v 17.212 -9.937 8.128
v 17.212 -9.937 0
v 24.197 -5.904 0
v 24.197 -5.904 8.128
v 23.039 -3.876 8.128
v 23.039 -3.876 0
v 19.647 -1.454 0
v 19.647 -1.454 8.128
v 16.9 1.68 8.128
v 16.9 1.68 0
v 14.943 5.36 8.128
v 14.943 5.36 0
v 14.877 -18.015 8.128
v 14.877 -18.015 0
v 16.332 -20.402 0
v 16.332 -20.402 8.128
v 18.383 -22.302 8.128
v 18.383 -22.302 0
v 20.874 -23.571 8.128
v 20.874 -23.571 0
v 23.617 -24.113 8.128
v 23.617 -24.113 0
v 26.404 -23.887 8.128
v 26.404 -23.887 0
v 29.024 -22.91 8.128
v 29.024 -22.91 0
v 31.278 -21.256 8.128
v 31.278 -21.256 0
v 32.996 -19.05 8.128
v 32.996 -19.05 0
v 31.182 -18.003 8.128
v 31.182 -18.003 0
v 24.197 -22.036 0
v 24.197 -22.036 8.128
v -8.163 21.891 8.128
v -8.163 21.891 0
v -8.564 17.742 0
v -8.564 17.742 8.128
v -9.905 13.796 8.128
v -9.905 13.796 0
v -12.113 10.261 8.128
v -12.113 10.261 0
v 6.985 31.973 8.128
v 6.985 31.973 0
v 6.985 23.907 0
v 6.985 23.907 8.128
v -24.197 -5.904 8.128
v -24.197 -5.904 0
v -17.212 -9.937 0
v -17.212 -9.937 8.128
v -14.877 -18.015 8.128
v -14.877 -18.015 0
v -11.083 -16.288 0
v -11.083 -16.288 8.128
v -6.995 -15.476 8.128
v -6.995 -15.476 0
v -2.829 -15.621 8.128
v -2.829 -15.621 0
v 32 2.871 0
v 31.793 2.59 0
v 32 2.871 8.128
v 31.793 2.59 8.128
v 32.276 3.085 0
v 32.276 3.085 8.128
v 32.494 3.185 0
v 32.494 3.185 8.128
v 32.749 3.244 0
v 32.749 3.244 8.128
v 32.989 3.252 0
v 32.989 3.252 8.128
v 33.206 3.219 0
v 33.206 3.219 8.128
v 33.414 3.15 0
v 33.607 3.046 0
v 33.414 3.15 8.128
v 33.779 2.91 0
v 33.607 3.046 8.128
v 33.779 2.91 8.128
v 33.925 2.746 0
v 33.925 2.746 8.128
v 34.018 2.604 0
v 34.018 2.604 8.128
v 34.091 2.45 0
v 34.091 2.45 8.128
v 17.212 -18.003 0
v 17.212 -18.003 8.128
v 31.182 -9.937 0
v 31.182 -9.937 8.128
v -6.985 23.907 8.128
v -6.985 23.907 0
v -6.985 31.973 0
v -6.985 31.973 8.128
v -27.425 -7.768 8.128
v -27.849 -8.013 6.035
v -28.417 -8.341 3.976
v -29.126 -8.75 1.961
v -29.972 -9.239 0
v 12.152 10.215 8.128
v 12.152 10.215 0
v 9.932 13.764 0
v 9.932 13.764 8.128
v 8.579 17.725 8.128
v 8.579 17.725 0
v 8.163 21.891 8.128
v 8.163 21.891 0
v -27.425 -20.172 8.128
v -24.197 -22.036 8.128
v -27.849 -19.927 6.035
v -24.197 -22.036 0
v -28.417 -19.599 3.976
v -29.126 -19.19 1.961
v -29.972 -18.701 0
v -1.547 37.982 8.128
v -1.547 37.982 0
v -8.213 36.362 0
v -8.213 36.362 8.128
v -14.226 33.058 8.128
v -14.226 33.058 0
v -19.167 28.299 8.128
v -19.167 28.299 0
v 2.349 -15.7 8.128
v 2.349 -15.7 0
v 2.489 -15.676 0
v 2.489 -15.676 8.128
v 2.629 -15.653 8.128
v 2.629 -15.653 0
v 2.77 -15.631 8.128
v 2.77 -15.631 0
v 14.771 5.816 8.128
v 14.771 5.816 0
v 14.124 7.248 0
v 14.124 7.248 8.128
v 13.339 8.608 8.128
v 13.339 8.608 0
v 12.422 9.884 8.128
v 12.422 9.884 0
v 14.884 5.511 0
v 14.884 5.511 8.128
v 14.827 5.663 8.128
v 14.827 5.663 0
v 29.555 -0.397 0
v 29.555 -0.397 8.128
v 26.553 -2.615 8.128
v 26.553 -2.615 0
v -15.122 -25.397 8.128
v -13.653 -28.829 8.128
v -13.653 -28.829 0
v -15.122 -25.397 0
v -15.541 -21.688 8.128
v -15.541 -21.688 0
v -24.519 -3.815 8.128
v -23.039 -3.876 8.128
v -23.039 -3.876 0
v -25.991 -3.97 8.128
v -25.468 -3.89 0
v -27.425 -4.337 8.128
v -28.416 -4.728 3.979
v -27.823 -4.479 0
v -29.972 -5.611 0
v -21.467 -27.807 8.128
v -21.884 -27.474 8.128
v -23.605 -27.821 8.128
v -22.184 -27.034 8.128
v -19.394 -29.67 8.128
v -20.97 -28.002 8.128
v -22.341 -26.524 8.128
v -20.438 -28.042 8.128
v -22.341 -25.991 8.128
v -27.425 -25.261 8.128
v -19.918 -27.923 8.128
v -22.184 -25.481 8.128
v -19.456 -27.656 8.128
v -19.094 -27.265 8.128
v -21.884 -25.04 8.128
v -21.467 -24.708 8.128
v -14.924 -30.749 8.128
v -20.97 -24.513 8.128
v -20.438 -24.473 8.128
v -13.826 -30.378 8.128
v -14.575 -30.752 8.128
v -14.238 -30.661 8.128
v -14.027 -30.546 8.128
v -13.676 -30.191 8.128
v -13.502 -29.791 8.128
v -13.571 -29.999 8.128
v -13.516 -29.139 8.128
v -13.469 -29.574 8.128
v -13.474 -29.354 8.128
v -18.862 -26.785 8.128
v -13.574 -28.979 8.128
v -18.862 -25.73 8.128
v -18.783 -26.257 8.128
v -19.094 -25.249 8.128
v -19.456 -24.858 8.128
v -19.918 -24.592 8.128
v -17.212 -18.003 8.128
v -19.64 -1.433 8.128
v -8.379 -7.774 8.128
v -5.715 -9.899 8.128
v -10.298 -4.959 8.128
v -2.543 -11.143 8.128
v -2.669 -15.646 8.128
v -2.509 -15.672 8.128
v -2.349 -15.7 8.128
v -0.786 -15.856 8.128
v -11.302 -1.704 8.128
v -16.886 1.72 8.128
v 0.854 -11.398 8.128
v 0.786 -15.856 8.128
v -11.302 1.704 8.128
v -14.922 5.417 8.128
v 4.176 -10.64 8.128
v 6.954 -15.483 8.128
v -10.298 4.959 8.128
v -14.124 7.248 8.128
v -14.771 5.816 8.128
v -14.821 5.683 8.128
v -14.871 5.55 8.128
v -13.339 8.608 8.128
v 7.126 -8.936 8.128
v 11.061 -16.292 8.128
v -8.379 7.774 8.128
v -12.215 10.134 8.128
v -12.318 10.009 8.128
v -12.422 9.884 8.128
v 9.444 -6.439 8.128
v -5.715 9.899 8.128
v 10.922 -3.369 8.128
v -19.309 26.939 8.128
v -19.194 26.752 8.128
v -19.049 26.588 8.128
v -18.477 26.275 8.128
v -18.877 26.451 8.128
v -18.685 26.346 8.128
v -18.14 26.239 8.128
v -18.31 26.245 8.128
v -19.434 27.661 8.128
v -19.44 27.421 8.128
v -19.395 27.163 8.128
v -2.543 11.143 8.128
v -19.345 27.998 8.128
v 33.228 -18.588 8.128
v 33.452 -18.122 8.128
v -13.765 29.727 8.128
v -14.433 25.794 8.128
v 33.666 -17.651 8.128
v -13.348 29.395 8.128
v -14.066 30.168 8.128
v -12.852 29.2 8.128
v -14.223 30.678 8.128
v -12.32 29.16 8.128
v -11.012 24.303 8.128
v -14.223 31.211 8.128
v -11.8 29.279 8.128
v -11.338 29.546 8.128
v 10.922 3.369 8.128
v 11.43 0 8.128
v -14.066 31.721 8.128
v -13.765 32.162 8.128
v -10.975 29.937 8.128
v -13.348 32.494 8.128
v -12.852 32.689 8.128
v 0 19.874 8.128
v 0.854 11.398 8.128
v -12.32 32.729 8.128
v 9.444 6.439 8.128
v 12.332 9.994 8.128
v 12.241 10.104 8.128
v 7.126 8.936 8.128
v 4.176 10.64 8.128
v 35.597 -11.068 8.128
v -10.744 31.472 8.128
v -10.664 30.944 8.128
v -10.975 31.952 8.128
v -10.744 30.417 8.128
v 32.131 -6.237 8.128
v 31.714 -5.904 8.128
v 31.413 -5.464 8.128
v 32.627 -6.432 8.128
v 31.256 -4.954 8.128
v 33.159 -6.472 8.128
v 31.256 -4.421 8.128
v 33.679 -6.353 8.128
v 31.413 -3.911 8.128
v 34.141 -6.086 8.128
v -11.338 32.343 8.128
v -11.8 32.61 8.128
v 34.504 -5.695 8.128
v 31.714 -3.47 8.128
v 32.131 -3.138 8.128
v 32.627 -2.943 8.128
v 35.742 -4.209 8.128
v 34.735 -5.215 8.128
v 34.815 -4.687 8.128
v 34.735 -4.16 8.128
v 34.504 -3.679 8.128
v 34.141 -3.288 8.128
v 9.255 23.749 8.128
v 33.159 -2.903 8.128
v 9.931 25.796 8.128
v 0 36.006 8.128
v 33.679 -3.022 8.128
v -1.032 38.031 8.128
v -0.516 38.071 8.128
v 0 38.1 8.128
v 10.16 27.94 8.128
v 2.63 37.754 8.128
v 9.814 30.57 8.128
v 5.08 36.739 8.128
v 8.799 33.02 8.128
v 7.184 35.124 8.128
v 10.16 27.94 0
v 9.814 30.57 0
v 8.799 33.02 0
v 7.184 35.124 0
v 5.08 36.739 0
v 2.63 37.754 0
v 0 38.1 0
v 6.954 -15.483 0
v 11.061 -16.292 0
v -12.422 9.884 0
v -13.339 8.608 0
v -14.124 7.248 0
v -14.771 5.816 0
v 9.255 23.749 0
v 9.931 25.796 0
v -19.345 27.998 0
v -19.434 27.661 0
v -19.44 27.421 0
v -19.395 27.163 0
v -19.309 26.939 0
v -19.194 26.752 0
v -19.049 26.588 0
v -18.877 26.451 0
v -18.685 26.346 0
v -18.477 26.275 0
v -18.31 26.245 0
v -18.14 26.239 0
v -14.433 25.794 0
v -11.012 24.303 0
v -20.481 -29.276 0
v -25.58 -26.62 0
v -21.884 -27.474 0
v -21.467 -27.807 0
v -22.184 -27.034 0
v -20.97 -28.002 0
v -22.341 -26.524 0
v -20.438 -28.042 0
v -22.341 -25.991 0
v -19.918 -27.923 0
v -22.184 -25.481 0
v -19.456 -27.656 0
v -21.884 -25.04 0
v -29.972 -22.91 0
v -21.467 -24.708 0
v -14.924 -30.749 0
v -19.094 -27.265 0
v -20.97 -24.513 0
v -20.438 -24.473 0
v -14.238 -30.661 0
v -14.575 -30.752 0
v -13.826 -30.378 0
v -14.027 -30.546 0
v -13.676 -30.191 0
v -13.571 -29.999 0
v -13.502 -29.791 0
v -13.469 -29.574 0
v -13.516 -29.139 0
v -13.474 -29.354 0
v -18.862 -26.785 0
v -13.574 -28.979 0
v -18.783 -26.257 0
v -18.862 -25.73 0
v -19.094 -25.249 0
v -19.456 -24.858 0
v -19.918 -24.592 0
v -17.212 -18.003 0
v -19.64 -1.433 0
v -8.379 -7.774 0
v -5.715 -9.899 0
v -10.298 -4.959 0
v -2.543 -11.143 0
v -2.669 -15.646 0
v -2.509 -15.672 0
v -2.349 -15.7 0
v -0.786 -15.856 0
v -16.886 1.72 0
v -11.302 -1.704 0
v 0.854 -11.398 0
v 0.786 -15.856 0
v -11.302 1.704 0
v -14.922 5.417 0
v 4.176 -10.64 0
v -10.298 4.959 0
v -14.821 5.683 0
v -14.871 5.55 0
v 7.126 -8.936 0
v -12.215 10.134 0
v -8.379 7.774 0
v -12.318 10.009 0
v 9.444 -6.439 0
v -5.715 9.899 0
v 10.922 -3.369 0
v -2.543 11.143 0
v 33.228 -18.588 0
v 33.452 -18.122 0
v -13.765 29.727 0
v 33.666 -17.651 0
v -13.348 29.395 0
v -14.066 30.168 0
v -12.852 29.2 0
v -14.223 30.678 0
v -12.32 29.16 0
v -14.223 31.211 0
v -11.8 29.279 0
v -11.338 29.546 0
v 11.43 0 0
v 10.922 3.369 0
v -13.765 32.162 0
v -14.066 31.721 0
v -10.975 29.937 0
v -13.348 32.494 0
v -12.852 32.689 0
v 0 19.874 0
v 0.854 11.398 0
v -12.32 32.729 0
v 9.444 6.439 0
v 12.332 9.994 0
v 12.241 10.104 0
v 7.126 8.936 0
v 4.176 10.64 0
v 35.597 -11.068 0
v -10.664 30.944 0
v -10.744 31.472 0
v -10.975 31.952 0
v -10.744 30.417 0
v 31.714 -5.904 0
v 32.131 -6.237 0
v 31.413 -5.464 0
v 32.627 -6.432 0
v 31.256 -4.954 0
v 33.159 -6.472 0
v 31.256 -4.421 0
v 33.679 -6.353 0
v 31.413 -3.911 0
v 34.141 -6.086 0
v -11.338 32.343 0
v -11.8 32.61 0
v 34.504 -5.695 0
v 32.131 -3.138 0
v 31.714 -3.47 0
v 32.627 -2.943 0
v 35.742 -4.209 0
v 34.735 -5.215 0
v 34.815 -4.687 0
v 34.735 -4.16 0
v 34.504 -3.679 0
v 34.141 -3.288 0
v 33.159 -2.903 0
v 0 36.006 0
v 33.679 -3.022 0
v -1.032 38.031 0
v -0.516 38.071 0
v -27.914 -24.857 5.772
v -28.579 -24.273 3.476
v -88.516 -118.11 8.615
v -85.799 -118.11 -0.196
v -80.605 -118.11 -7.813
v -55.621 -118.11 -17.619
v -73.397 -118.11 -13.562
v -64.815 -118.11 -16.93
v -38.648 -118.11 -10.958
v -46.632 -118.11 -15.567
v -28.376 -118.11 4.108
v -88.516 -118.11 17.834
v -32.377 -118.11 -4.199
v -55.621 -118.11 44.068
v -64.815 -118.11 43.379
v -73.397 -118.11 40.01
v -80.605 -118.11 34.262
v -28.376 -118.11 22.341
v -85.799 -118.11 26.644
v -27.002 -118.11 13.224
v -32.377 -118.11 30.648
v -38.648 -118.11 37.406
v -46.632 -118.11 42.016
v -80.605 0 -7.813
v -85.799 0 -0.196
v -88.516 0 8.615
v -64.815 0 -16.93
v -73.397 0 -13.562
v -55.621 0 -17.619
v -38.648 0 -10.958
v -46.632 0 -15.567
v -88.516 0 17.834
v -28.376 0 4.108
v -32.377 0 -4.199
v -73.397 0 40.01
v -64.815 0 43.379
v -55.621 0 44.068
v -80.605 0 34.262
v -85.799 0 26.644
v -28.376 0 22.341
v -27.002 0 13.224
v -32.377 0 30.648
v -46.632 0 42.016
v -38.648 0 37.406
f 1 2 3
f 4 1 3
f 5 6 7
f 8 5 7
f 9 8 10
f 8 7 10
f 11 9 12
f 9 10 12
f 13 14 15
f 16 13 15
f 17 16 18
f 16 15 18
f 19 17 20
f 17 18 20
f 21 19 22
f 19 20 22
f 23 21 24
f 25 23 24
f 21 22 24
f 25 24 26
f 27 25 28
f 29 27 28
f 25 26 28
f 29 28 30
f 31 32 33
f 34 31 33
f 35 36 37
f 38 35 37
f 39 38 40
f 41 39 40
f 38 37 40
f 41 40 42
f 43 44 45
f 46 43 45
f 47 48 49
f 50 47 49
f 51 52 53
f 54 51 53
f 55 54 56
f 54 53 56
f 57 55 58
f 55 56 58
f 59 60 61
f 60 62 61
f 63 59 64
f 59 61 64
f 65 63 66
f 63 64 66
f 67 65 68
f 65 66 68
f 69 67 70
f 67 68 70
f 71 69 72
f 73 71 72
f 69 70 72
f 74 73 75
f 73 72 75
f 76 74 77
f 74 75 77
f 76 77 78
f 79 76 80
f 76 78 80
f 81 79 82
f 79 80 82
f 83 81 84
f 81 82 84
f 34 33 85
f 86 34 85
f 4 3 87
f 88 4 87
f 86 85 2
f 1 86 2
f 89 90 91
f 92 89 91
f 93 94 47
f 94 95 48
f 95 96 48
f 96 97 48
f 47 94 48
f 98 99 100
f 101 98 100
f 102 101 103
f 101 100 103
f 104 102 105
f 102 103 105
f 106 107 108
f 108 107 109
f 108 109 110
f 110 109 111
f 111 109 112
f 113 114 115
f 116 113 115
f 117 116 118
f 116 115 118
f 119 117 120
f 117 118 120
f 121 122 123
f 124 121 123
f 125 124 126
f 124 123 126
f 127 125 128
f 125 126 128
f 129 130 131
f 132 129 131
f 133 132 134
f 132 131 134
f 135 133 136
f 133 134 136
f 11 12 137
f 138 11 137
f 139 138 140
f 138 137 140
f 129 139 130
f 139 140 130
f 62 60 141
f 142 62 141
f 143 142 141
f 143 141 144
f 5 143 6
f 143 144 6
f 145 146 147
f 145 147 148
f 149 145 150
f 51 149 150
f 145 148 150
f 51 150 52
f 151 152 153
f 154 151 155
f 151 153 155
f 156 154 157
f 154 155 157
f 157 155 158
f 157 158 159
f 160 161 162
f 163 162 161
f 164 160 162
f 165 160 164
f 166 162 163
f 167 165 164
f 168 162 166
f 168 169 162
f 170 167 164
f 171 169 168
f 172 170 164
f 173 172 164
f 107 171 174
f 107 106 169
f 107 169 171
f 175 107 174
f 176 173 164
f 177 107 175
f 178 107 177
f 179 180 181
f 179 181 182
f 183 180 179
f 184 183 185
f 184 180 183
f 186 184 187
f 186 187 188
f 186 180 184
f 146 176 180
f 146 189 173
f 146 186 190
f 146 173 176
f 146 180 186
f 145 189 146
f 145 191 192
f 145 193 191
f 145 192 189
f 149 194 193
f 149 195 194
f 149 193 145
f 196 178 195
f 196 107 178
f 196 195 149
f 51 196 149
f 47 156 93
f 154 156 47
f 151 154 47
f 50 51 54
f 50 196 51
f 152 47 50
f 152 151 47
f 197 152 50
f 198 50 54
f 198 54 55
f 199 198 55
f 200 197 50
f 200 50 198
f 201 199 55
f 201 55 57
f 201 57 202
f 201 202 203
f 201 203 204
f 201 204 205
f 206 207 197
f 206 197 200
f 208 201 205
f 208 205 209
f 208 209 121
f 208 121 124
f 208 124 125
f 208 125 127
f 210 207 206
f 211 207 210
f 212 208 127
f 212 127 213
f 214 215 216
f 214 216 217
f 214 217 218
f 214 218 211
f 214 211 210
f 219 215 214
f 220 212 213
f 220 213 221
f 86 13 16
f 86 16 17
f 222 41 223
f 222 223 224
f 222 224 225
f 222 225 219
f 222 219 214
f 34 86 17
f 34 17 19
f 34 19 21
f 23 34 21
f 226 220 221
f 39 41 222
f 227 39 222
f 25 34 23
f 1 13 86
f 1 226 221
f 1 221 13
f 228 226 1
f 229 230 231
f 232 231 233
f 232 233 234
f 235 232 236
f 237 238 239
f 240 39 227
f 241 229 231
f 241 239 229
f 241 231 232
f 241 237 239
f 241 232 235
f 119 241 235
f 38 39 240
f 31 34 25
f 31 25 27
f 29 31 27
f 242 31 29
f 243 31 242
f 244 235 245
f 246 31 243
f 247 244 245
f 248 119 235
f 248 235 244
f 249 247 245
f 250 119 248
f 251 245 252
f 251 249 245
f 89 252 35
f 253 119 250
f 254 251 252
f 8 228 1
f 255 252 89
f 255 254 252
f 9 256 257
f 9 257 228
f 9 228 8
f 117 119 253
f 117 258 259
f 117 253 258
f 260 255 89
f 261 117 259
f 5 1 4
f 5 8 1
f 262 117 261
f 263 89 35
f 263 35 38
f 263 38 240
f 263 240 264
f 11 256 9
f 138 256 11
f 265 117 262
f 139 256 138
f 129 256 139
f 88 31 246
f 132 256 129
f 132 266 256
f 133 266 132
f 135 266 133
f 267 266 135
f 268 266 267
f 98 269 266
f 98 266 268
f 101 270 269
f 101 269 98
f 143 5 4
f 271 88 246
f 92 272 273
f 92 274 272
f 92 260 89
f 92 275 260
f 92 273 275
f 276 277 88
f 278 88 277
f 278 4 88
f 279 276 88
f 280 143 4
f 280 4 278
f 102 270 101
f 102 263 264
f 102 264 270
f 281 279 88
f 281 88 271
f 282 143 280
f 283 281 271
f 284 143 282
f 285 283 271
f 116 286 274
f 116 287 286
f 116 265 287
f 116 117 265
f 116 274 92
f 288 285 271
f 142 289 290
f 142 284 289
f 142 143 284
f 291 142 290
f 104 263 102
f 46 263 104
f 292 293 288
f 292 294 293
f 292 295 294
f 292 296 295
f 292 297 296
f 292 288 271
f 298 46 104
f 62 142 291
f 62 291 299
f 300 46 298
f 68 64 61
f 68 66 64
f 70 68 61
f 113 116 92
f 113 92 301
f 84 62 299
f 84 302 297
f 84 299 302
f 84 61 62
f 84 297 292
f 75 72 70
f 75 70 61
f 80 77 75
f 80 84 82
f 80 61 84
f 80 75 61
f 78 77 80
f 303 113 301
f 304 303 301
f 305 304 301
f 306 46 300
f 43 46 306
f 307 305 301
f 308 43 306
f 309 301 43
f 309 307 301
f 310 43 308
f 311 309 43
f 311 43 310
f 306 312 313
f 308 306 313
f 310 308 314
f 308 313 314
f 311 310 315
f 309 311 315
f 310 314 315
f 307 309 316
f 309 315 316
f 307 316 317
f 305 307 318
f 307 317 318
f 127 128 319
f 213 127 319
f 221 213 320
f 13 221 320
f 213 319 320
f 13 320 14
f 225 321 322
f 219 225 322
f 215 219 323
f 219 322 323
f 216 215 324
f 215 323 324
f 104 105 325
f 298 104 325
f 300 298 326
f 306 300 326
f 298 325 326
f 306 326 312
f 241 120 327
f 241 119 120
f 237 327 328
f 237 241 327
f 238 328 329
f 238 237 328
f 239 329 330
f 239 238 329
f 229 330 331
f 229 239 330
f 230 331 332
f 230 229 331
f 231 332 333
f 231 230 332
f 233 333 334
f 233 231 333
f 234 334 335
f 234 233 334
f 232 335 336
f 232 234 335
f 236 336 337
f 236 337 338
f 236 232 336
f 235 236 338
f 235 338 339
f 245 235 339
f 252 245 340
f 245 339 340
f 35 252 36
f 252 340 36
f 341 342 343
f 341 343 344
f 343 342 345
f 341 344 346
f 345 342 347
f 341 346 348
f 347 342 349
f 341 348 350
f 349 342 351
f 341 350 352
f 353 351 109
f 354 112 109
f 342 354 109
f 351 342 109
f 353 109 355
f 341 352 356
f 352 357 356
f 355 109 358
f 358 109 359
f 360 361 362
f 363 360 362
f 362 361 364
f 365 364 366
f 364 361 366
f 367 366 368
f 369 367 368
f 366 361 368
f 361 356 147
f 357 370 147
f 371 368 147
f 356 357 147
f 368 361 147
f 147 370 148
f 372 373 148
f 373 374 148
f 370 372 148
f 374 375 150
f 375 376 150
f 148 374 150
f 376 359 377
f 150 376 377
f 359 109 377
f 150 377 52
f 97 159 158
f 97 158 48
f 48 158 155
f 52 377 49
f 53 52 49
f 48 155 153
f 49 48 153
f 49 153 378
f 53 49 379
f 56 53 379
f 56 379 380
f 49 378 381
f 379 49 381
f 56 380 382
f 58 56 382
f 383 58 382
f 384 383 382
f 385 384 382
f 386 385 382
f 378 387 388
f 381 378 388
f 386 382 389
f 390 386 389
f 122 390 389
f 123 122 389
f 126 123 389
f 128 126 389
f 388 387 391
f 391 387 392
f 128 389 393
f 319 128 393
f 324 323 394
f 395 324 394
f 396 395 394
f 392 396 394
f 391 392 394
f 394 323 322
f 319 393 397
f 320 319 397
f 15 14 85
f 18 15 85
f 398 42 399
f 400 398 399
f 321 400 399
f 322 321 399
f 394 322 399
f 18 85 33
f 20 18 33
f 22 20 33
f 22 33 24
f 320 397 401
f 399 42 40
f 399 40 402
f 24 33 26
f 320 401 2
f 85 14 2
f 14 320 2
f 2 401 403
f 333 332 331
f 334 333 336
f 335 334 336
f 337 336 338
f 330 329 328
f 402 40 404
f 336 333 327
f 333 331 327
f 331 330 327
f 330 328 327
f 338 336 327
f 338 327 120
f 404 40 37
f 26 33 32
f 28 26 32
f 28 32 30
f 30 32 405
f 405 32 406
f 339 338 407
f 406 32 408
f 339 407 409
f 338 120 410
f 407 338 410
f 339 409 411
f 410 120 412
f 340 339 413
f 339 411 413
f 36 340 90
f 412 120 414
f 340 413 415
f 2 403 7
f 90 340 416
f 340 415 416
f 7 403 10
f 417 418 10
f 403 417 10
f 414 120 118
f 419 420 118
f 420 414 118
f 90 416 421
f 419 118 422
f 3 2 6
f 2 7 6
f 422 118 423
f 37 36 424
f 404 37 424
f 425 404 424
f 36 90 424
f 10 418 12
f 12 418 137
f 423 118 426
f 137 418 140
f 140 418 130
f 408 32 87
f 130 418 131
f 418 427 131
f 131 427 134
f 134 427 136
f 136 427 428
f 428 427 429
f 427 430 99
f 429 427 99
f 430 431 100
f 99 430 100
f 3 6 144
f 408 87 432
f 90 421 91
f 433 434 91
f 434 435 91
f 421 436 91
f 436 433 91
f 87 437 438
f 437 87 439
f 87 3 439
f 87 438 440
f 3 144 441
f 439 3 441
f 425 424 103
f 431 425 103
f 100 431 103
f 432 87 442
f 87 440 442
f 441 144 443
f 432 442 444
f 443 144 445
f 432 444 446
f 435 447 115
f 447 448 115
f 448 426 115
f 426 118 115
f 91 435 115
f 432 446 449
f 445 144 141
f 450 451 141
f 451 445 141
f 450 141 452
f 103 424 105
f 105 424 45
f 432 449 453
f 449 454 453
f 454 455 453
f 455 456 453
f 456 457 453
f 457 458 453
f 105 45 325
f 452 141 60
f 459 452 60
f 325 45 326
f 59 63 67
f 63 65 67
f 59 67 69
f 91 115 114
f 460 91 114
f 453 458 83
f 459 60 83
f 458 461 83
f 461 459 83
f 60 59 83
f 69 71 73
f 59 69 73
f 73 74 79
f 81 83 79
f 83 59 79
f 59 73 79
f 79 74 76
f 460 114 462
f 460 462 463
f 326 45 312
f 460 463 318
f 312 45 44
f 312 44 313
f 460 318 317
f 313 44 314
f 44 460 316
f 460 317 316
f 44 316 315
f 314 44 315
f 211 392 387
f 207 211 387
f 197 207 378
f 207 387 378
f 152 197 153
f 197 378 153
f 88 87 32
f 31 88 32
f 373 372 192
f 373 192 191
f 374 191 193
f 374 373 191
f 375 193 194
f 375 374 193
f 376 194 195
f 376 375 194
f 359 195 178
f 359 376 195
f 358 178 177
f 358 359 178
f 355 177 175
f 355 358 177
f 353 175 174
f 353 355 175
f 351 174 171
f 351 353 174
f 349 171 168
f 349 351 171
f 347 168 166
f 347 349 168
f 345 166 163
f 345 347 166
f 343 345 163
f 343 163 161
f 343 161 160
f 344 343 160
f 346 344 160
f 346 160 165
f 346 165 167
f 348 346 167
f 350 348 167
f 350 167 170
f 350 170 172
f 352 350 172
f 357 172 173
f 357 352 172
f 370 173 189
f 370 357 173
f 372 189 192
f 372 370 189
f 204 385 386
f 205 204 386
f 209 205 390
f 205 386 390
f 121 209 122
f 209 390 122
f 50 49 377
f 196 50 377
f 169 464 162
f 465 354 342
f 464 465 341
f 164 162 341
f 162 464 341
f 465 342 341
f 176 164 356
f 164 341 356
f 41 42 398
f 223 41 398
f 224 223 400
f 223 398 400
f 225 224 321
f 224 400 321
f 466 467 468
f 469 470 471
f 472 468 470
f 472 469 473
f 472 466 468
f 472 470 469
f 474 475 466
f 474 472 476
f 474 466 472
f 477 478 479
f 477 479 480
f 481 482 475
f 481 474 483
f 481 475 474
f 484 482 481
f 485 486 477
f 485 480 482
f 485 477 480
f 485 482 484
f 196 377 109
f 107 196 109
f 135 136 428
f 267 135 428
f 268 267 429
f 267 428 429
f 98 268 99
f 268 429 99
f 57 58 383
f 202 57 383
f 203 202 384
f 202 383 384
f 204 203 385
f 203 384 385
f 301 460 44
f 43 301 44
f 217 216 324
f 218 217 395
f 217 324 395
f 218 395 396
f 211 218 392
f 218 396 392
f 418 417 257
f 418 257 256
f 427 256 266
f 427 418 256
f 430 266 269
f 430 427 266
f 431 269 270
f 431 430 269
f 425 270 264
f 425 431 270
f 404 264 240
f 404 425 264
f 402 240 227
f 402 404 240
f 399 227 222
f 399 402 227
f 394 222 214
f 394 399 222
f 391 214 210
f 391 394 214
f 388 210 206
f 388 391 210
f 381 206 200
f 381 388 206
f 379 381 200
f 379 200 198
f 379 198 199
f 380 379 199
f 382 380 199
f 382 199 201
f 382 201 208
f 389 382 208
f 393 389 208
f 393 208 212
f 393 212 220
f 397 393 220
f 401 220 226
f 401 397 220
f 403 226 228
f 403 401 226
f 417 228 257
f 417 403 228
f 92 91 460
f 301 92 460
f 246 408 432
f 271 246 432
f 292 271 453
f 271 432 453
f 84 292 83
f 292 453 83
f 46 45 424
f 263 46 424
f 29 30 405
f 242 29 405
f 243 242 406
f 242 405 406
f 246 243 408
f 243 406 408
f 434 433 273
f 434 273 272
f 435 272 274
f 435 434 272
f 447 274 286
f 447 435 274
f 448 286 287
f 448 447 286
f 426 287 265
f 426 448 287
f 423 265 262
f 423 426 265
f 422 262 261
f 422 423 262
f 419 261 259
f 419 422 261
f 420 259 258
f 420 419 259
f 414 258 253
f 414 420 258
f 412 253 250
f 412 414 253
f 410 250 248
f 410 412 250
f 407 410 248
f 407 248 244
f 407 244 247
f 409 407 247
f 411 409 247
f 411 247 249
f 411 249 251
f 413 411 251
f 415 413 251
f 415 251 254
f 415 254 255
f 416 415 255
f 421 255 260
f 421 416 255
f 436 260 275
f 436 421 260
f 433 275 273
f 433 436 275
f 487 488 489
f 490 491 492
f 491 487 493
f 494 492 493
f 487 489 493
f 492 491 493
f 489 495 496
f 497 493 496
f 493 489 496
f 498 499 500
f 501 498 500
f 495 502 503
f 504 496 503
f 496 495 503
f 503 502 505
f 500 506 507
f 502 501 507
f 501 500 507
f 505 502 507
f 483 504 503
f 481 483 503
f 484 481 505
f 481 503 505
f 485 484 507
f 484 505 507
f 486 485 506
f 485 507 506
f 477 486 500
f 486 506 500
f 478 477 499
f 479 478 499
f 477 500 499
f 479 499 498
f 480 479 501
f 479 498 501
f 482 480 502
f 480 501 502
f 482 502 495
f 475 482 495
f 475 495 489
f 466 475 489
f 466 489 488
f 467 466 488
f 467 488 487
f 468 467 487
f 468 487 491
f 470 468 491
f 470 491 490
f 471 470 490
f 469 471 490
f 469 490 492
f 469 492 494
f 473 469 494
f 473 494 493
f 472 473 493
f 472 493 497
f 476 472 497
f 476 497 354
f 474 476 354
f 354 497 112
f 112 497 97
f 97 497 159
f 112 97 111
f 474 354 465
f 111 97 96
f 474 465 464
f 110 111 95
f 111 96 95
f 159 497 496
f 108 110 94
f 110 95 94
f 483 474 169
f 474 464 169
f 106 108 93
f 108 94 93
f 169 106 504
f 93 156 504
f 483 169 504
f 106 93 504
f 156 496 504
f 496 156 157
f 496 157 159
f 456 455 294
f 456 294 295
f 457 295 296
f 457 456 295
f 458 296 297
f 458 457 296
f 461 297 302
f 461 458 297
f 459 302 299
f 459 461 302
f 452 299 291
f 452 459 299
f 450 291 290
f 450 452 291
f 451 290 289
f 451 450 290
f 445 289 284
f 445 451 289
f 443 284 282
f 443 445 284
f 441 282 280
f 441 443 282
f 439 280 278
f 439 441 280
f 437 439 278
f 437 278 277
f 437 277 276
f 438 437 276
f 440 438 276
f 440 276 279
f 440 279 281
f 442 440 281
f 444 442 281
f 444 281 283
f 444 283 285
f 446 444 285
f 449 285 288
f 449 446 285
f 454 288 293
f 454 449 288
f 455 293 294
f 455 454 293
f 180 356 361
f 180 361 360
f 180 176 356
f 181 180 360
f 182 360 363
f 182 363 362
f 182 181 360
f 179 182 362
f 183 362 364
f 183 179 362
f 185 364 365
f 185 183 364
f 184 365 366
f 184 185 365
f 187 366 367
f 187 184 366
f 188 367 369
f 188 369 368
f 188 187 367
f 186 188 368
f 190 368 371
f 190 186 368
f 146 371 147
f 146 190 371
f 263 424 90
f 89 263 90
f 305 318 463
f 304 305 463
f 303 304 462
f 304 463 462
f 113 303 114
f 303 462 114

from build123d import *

# Parameters (mm, degrees)
F0_R     = 1.78928
F0_R_2   = 11.43
F1_DEPTH = 8.128
F2_R     = 1.27
F3_R     = 30.929844
F4_DEPTH = 118.11


with BuildPart() as f1:
    # F0 (on Top) → F1 (new body)
    with BuildSketch(Plane.XY):
        with BuildLine():
            ThreePointArc((12.152307, 10.214552), (9.141542, 15.705526), (8.1629, 21.890813))
            ThreePointArc((8.1629, 21.890813), (0, 17.78), (-8.1629, 21.890813))
            ThreePointArc((-8.1629, 21.890813), (-9.120339, 15.730112), (-12.113273, 10.260811))
            ThreePointArc((-12.113273, 10.260811), (0.030263, 15.874971), (12.152307, 10.214552))
        make_face()
        with BuildLine():
            ThreePointArc((10.16, 27.94), (7.184205, 35.124205), (0, 38.1))
            ThreePointArc((0, 38.1), (-0.774338, 38.052294), (-1.546912, 37.981547))
            ThreePointArc((-1.546912, 37.981547), (-9.396704, 31.80362), (-8.1629, 21.890813))
            ThreePointArc((-8.1629, 21.890813), (0, 17.78), (8.1629, 21.890813))
            ThreePointArc((8.1629, 21.890813), (9.647815, 24.754836), (10.16, 27.94))
        make_face()
        Polygon((-6.985, 31.972792), (0, 36.005583), (6.985, 31.972792), (6.985, 23.907208), (0, 19.874417), (-6.985, 23.907208), align=None, mode=Mode.SUBTRACT)
        with BuildLine():
            ThreePointArc((-8.1629, 21.890813), (-9.396704, 31.80362), (-1.546912, 37.981547))
            ThreePointArc((-1.546912, 37.981547), (-12.612928, 34.15479), (-20.884238, 25.867077))
            ThreePointArc((-20.884238, 25.867077), (-13.967457, 25.658122), (-8.1629, 21.890813))
        make_face()
        with Locations((-12.453423, 30.944496)):
            Circle(F0_R, mode=Mode.SUBTRACT)
        with BuildLine():
            ThreePointArc((2.348846, -15.700272), (2.559176, -15.664647), (2.769908, -15.631482))
            ThreePointArc((2.769908, -15.631482), (12.165277, -10.199101), (15.875, 0))
            ThreePointArc((15.875, 0), (15.640204, 2.720232), (14.942759, 5.359997))
            ThreePointArc((14.942759, 5.359997), (14.855473, 5.587409), (14.771257, 5.815976))
            ThreePointArc((14.771257, 5.815976), (13.748153, 7.9375), (12.422412, 9.884296))
            ThreePointArc((12.422412, 9.884296), (12.286395, 10.048635), (12.152307, 10.214552))
            ThreePointArc((12.152307, 10.214552), (0.030263, 15.874971), (-12.113273, 10.260811))
            ThreePointArc((-12.113273, 10.260811), (-12.266574, 10.071512), (-12.422412, 9.884296))
            ThreePointArc((-12.422412, 9.884296), (-13.748153, 7.9375), (-14.771257, 5.815976))
            ThreePointArc((-14.771257, 5.815976), (-14.845571, 5.616012), (-14.922215, 5.41693))
            ThreePointArc((-14.922215, 5.41693), (-13.76326, -7.911277), (-2.829486, -15.620808))
            ThreePointArc((-2.829486, -15.620808), (-2.588898, -15.658921), (-2.348846, -15.700272))
            ThreePointArc((-2.348846, -15.700272), (0, -15.875), (2.348846, -15.700272))
        make_face()
        Circle(F0_R_2, mode=Mode.SUBTRACT)
        with BuildLine():
            ThreePointArc((-23.03945, -3.876128), (-32.691442, -8.39633), (-32.995568, -19.05))
            ThreePointArc((-32.995568, -19.05), (-32.567084, -19.696744), (-32.119528, -20.330439))
            ThreePointArc((-32.119528, -20.330439), (-22.844391, -24.039594), (-14.87655, -18.014685))
            ThreePointArc((-14.87655, -18.014685), (-14.248915, -16.035474), (-14.03675, -13.97))
            ThreePointArc((-14.03675, -13.97), (-16.614409, -7.207329), (-23.03945, -3.876128))
        make_face()
        Polygon((-17.21175, -9.937208), (-17.21175, -18.002792), (-24.19675, -22.035583), (-31.18175, -18.002792), (-31.18175, -9.937208), (-24.19675, -5.904417), align=None, mode=Mode.SUBTRACT)
        with BuildLine():
            ThreePointArc((-14.922215, 5.41693), (-18.172156, 0.064044), (-23.03945, -3.876128))
            ThreePointArc((-23.03945, -3.876128), (-16.614409, -7.207329), (-14.03675, -13.97))
            ThreePointArc((-14.03675, -13.97), (-14.248915, -16.035474), (-14.87655, -18.014685))
            ThreePointArc((-14.87655, -18.014685), (-9.062508, -15.763501), (-2.829486, -15.620808))
            ThreePointArc((-2.829486, -15.620808), (-13.76326, -7.911277), (-14.922215, 5.41693))
        make_face()
        with BuildLine():
            ThreePointArc((-14.87655, -18.014685), (-22.844391, -24.039594), (-32.119528, -20.330439))
            ThreePointArc((-32.119528, -20.330439), (-23.272452, -28.000511), (-11.959427, -31.019819))
            ThreePointArc((-11.959427, -31.019819), (-15.236857, -24.925234), (-14.87655, -18.014685))
        make_face()
        with Locations((-20.572009, -26.257229)):
            Circle(F0_R, mode=Mode.SUBTRACT)
        with BuildLine():
            ThreePointArc((2.769908, -15.631482), (9.030614, -15.76957), (14.87655, -18.014685))
            ThreePointArc((14.87655, -18.014685), (15.397932, -8.89), (23.03945, -3.876128))
            ThreePointArc((23.03945, -3.876128), (18.182846, 0.033389), (14.942759, 5.359997))
            ThreePointArc((14.942759, 5.359997), (15.640204, 2.720232), (15.875, 0))
            ThreePointArc((15.875, 0), (12.165277, -10.199101), (2.769908, -15.631482))
        make_face()
        with BuildLine():
            ThreePointArc((14.87655, -18.014685), (23.617156, -24.113455), (32.995568, -19.05))
            ThreePointArc((32.995568, -19.05), (33.341423, -18.355551), (33.666441, -17.651108))
            ThreePointArc((33.666441, -17.651108), (34.182681, -15.842637), (34.35675, -13.97))
            ThreePointArc((34.35675, -13.97), (30.95942, -6.38766), (23.03945, -3.876128))
            ThreePointArc((23.03945, -3.876128), (15.397932, -8.89), (14.87655, -18.014685))
        make_face()
        Polygon((17.21175, -9.937208), (24.19675, -5.904417), (31.18175, -9.937208), (31.18175, -18.002792), (24.19675, -22.035583), (17.21175, -18.002792), align=None, mode=Mode.SUBTRACT)
        with BuildLine():
            ThreePointArc((34.35675, -13.97), (34.182681, -15.842637), (33.666441, -17.651108))
            ThreePointArc((33.666441, -17.651108), (35.88538, -6.154279), (32.843664, 5.152742))
            ThreePointArc((32.843664, 5.152742), (29.204314, -0.732888), (23.03945, -3.876128))
            ThreePointArc((23.03945, -3.876128), (30.95942, -6.38766), (34.35675, -13.97))
        make_face()
        with Locations((33.025431, -4.687268)):
            Circle(F0_R, mode=Mode.SUBTRACT)
    extrude(amount=F1_DEPTH)

    # F2
    f2_edges = [f1.edges().sort_by_distance(p)[0] for p in [
        (-20.884238, 25.867077, 4.064),
        (-11.959427, -31.019819, 4.064),
        (32.843664, 5.152742, 4.064),
    ]]
    fillet(f2_edges, radius=F2_R)

    # F3 (on Front) → F4 (join)
    with BuildSketch(Plane.XZ):
        with Locations((-57.932083, 13.224379)):
            Circle(F3_R)
    extrude(amount=F4_DEPTH)


solid = f1.part
